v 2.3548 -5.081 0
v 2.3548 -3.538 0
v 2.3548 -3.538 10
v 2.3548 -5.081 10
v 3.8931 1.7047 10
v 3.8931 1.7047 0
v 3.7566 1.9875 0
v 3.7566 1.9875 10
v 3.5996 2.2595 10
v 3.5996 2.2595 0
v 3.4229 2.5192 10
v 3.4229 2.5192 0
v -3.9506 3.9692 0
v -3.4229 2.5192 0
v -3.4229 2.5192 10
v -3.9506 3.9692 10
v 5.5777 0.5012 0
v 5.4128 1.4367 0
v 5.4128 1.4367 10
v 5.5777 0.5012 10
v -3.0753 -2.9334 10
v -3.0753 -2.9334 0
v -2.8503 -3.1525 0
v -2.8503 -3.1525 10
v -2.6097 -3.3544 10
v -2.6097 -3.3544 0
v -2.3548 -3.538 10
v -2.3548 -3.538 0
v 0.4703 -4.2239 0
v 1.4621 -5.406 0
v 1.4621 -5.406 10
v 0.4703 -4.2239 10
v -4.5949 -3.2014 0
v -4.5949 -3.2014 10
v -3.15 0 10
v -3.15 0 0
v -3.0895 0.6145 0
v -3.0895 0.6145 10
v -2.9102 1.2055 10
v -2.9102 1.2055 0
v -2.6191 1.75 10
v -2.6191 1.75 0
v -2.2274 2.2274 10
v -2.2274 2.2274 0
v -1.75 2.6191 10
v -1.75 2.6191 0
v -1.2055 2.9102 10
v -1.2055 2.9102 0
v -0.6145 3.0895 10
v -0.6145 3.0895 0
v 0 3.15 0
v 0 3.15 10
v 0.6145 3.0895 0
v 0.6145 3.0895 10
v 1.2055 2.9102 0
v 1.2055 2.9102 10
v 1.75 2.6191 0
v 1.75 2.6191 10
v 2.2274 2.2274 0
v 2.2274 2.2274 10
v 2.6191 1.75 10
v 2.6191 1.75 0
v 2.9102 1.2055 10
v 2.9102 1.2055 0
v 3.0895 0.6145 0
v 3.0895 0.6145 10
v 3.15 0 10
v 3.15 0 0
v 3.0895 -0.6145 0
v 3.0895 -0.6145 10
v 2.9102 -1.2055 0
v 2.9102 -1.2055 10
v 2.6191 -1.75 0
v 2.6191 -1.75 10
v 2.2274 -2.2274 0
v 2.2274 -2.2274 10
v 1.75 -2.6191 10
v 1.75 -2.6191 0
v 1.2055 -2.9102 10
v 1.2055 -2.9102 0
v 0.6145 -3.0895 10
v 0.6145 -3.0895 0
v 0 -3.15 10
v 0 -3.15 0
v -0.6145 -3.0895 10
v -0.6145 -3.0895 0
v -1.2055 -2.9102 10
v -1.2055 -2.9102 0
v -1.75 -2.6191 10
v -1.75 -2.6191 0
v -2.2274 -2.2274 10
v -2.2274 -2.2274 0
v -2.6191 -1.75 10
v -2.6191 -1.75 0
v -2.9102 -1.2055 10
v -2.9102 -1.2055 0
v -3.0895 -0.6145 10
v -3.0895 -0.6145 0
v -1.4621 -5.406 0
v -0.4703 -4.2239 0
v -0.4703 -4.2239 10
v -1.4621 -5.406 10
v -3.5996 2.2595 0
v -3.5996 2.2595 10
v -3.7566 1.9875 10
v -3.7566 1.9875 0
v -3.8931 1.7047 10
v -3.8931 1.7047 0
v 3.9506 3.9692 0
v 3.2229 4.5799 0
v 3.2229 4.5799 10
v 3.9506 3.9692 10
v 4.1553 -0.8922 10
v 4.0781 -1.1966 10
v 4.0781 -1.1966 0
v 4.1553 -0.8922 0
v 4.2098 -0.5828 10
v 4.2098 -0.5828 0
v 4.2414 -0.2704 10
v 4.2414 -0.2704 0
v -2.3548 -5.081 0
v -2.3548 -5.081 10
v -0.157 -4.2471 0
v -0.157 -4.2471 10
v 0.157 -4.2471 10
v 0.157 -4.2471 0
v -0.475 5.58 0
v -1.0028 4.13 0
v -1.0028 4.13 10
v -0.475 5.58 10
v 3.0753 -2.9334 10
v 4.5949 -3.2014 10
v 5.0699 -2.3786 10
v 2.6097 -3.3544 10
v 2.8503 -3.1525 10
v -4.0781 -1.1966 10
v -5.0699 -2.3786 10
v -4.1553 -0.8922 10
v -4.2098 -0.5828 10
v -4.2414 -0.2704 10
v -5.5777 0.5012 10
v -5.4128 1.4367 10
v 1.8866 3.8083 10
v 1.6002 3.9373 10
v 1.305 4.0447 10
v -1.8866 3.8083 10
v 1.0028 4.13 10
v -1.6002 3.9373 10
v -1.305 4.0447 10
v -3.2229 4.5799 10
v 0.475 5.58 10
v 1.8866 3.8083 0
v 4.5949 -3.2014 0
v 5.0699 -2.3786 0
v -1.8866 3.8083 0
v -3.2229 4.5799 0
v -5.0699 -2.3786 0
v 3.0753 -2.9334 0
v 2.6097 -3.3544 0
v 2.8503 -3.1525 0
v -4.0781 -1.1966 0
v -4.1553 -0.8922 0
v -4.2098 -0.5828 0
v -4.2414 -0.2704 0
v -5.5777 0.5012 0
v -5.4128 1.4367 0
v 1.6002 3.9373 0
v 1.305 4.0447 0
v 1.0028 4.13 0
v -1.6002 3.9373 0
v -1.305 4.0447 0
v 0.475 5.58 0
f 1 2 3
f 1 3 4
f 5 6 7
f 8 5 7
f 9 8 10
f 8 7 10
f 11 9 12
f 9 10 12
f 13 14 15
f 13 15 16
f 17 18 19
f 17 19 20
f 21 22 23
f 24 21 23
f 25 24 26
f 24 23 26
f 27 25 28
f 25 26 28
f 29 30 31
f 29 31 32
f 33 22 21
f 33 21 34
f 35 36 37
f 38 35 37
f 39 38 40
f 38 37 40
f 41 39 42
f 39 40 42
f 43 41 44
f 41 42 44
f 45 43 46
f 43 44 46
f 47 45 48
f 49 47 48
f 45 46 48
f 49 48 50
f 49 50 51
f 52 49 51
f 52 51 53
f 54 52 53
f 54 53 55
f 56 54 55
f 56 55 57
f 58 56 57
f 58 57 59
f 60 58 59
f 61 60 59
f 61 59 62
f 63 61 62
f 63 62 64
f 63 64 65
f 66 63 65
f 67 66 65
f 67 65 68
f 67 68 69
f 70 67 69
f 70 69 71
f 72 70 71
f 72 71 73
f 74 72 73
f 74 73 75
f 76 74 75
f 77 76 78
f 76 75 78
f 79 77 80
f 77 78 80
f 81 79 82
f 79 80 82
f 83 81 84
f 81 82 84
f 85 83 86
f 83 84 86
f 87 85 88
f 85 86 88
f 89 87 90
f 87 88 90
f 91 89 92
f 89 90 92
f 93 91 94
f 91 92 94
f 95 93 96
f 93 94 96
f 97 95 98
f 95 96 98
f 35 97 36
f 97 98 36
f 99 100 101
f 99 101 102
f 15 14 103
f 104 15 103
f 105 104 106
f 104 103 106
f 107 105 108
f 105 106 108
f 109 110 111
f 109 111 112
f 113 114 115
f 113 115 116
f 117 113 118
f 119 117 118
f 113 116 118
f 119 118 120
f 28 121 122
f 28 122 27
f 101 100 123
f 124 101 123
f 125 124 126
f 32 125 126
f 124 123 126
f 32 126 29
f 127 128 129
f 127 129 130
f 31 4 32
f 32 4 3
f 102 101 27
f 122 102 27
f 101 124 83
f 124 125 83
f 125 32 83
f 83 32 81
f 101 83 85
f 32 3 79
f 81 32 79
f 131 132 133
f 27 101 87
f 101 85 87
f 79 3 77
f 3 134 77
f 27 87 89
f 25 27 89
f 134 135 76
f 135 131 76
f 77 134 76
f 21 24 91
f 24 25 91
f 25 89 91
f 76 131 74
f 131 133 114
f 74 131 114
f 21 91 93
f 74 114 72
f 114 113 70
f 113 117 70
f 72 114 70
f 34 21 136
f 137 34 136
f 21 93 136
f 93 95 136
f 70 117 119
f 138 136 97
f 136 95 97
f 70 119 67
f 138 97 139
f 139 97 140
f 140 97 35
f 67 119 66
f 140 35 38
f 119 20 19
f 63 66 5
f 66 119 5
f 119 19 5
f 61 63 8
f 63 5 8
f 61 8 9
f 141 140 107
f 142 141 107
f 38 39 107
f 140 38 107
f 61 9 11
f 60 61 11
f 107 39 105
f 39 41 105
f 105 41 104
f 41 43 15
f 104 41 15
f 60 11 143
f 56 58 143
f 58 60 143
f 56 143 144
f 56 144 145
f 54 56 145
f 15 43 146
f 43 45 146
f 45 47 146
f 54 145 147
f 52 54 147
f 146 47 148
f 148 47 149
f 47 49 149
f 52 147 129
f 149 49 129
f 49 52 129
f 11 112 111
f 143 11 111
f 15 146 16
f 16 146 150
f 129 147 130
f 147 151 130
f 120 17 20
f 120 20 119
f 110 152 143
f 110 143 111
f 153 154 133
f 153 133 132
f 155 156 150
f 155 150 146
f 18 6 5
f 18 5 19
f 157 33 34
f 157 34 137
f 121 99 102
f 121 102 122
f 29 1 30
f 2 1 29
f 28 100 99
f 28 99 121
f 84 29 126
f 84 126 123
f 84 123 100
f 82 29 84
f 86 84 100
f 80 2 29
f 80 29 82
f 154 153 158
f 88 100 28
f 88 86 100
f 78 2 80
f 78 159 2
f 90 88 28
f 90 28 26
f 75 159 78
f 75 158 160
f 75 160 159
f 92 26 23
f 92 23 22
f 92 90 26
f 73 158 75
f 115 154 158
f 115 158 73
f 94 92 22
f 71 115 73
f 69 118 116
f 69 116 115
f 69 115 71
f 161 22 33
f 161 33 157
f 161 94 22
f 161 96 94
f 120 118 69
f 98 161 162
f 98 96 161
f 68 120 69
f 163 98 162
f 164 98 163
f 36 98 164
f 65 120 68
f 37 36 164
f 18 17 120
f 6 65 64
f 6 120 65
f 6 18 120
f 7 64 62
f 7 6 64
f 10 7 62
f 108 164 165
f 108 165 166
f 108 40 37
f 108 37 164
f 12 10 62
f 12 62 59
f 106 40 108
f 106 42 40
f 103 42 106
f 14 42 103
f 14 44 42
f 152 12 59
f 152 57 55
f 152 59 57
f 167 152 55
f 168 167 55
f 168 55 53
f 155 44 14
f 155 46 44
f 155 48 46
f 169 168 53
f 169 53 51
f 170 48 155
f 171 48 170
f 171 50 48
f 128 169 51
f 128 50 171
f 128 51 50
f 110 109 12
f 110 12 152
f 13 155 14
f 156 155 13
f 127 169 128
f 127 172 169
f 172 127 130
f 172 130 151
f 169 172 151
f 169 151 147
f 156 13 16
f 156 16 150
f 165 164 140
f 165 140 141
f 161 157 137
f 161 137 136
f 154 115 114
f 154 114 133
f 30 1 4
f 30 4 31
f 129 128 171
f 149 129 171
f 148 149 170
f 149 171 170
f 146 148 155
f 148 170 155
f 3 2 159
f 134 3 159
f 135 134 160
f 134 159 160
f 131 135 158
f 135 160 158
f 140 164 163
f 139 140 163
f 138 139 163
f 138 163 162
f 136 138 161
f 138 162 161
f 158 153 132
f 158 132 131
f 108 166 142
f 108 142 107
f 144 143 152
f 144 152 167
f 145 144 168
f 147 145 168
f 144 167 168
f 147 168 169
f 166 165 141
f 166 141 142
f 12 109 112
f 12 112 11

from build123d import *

# Parameters (mm, degrees)
SKETCH1_R         = 4.25
EXTRUDE1_DEPTH    = 10
SKETCH3_R         = 3.15
EXTRUDE2_DEPTH    = 11
EXTRUDE3_DEPTH    = 10
CIRPATTERN1_COUNT = 9


with BuildPart() as part:
    # Sketch1 → Extrude1 (new body)
    with BuildSketch(Plane.XY):
        Circle(SKETCH1_R)
    extrude(amount=EXTRUDE1_DEPTH)

    # Sketch3 → Extrude2 (cut, through all)
    with BuildSketch(Plane(origin=(0, 0, 0), x_dir=(-1, 0, 0), z_dir=(0, 0, -1))):
        Circle(SKETCH3_R)
    extrude(amount=-EXTRUDE2_DEPTH, mode=Mode.SUBTRACT)

    # Sketch4 → Extrude3 (add)
    with BuildSketch(Plane.XY):
        Polygon((-0.475, 5.58000953), (0.475, 5.58000953), (1.00275684, 4.13000953), (-1.00275684, 4.13000953), align=None)
    extrude3 = extrude(amount=EXTRUDE3_DEPTH)

    # CirPattern1: Extrude3 ×9 about axis
    cirpattern1_axis = Axis((0, 0, 0), (0, 0, 1))
    for i in range(1, CIRPATTERN1_COUNT):
        add(extrude3.rotate(cirpattern1_axis, i * 360 / CIRPATTERN1_COUNT))


solid = part.part
